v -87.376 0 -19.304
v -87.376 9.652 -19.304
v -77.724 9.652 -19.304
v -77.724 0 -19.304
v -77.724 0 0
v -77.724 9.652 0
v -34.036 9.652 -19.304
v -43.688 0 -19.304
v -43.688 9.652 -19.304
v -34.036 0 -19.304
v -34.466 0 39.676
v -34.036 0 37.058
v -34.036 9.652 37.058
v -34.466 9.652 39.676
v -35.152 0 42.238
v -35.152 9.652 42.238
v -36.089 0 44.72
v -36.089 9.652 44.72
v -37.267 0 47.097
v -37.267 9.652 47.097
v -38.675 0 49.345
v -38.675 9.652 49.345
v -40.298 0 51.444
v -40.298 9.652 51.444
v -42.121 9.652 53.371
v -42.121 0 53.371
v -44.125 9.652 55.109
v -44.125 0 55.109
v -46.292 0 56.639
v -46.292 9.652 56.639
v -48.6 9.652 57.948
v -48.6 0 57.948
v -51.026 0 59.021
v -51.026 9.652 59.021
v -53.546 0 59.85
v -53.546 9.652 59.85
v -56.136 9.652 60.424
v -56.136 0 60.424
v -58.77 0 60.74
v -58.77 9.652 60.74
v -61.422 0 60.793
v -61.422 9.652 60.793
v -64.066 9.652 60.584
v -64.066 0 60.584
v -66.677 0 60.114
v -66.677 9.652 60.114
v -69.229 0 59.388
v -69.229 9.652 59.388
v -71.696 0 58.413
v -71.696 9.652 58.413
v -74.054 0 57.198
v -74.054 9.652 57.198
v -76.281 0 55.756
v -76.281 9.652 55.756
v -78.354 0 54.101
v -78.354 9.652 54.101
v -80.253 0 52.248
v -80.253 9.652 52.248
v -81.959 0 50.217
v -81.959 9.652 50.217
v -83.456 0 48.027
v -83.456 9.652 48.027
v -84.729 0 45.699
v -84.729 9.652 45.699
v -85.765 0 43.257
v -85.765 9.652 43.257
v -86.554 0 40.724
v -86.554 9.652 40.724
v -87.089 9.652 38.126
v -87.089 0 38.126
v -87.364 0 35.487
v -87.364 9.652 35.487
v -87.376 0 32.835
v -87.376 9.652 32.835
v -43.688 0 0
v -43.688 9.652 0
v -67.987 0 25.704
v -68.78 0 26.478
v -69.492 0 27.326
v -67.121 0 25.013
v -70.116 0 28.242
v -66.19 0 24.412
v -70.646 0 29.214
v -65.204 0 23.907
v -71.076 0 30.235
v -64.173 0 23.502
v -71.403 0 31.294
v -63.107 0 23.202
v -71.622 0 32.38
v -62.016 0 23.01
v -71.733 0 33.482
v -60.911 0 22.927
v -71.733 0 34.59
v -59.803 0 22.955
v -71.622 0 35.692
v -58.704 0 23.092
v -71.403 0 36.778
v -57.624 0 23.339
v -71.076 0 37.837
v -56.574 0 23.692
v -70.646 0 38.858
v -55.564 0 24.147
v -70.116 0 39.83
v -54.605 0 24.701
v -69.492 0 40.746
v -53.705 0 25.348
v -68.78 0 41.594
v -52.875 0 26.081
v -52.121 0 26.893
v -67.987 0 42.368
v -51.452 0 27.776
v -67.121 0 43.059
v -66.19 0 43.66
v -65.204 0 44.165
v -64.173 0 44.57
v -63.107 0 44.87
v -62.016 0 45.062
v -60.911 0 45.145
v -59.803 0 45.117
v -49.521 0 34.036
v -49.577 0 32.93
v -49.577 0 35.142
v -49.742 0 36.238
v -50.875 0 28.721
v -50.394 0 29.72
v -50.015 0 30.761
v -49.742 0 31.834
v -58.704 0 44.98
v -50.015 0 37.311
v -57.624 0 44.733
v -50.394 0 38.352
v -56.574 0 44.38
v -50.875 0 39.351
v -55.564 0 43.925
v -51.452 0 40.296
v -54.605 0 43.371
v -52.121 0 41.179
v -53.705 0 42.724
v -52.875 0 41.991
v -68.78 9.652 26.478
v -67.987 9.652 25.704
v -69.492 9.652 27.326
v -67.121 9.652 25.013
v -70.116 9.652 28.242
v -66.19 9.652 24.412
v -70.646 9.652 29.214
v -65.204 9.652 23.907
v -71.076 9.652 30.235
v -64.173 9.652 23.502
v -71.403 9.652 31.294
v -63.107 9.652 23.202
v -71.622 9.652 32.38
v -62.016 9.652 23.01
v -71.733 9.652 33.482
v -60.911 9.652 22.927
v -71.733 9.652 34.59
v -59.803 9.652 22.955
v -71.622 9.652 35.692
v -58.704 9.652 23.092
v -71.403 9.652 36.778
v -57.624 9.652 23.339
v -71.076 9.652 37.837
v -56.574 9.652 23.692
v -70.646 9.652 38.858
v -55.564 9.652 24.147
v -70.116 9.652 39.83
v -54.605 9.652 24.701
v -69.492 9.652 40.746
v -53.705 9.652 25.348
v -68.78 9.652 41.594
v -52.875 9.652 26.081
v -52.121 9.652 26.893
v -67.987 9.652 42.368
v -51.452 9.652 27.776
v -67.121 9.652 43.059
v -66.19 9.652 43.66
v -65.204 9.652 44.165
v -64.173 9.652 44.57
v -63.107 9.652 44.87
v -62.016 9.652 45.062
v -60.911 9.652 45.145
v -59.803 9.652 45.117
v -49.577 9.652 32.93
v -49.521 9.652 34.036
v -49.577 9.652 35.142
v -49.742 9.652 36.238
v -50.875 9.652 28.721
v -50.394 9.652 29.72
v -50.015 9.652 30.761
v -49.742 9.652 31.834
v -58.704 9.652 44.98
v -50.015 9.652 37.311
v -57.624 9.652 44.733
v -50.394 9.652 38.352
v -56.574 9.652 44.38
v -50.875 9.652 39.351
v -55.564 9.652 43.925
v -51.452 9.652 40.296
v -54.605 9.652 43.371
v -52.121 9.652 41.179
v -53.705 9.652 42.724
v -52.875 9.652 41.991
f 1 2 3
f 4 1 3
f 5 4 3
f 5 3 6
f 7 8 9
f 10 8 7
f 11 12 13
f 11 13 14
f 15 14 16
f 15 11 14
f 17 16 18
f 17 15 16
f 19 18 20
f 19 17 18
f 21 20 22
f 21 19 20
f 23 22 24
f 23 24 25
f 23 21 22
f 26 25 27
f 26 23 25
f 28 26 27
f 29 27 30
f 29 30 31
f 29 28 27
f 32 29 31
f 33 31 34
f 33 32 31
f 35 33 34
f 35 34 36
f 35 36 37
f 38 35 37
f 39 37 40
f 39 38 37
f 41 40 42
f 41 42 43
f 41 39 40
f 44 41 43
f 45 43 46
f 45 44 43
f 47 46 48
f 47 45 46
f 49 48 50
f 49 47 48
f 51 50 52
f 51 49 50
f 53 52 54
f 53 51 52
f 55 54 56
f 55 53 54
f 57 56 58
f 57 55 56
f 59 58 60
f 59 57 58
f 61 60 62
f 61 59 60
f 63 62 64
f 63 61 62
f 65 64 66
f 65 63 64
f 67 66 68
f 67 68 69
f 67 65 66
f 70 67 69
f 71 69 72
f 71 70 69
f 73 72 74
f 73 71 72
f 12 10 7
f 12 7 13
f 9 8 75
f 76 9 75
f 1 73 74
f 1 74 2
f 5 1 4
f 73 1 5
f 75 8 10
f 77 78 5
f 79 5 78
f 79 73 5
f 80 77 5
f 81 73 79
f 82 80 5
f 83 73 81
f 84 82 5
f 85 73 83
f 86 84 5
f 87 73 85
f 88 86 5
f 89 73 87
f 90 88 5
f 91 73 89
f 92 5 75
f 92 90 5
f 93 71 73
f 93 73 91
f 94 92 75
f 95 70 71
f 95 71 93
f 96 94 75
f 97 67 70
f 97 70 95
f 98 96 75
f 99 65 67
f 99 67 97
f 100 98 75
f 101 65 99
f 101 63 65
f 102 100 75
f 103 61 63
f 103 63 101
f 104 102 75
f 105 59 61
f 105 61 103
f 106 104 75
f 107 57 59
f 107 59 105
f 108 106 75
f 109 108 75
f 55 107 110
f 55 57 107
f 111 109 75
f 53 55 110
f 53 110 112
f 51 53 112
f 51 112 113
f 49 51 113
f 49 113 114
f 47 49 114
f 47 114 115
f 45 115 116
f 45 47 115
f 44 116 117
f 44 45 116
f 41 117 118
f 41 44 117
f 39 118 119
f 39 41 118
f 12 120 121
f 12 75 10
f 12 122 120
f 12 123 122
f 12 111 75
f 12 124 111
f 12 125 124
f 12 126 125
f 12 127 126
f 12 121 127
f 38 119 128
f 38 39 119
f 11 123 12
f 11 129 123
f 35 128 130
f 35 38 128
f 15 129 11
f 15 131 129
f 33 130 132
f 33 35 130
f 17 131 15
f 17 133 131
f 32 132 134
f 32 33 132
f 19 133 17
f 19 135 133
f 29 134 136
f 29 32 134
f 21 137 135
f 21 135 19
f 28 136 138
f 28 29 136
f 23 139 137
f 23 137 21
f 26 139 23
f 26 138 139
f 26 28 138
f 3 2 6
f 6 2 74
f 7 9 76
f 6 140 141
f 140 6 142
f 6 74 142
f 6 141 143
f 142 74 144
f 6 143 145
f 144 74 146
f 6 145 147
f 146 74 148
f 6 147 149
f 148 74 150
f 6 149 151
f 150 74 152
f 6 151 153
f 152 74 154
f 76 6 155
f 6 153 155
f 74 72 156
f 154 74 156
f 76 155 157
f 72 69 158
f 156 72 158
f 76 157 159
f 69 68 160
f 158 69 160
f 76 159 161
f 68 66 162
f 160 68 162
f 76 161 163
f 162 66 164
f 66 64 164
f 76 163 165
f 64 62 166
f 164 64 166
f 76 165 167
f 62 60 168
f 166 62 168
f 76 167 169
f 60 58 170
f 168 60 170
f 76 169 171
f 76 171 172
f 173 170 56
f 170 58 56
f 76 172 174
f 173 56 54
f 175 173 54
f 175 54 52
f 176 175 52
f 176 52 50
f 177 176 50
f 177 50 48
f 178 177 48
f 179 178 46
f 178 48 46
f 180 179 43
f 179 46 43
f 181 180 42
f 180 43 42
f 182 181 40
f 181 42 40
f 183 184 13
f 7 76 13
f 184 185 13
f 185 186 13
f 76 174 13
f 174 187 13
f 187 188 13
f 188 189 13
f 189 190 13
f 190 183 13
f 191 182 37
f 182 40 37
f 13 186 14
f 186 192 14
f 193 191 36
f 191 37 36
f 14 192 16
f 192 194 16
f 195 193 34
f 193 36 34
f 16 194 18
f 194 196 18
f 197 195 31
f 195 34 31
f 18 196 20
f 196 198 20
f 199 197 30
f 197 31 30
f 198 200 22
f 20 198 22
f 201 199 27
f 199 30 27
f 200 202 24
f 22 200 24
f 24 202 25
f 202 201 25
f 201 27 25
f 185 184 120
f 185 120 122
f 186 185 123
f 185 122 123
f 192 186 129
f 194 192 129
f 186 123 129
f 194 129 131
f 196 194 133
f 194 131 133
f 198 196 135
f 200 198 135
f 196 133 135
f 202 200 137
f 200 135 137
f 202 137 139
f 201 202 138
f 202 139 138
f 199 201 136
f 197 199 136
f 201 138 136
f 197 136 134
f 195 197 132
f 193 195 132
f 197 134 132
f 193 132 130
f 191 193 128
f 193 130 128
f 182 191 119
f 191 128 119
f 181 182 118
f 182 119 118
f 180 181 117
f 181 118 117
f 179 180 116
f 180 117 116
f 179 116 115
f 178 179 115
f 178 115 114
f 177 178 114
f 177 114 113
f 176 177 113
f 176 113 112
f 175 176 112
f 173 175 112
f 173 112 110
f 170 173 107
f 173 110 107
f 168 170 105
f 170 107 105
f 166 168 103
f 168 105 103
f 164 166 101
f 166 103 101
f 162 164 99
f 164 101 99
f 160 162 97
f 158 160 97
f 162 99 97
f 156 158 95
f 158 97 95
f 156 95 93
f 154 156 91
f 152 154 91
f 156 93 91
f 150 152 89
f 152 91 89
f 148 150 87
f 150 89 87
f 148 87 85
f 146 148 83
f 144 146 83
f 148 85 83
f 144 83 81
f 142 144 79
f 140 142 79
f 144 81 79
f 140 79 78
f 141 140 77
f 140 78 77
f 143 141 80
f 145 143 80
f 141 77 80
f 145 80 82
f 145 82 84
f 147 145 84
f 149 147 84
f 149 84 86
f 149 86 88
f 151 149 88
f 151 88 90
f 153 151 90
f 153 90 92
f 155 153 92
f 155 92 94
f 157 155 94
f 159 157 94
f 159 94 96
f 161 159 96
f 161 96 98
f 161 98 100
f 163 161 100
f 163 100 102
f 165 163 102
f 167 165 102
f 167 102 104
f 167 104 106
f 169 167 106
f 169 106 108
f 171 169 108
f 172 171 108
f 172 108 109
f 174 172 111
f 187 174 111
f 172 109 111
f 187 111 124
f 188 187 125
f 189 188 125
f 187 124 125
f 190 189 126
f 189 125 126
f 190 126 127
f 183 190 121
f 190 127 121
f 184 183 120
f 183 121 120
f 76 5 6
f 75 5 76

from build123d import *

# Parameters (mm, degrees)
F0_W     = 9.652
F0_H     = 19.304
F0_R     = 11.1125
F1_DEPTH = 9.652


with BuildPart() as f1:
    # F0 (on Front) → F1 (new body)
    with BuildSketch(Plane.XZ):
        with Locations((-82.55, -9.652)):
            Rectangle(F0_W, F0_H)
        with Locations((-38.862, -9.652)):
            Rectangle(F0_W, F0_H)
        with BuildLine():
            Line((-43.688, 0), (-34.036, 0))
            Line((-34.036, 0), (-34.036, 34.036))
            Line((-34.036, 34.036), (-34.036, 37.05788))
            ThreePointArc((-34.036, 37.05788), (-62.746785, 60.721529), (-87.376, 32.834629))
            Line((-87.376, 32.834629), (-87.376, 0))
            Line((-87.376, 0), (-77.724, 0))
            Line((-77.724, 0), (-43.688, 0))
        make_face()
        with Locations((-60.63393, 34.036)):
            Circle(F0_R, mode=Mode.SUBTRACT)
    extrude(amount=-F1_DEPTH)


solid = f1.part
